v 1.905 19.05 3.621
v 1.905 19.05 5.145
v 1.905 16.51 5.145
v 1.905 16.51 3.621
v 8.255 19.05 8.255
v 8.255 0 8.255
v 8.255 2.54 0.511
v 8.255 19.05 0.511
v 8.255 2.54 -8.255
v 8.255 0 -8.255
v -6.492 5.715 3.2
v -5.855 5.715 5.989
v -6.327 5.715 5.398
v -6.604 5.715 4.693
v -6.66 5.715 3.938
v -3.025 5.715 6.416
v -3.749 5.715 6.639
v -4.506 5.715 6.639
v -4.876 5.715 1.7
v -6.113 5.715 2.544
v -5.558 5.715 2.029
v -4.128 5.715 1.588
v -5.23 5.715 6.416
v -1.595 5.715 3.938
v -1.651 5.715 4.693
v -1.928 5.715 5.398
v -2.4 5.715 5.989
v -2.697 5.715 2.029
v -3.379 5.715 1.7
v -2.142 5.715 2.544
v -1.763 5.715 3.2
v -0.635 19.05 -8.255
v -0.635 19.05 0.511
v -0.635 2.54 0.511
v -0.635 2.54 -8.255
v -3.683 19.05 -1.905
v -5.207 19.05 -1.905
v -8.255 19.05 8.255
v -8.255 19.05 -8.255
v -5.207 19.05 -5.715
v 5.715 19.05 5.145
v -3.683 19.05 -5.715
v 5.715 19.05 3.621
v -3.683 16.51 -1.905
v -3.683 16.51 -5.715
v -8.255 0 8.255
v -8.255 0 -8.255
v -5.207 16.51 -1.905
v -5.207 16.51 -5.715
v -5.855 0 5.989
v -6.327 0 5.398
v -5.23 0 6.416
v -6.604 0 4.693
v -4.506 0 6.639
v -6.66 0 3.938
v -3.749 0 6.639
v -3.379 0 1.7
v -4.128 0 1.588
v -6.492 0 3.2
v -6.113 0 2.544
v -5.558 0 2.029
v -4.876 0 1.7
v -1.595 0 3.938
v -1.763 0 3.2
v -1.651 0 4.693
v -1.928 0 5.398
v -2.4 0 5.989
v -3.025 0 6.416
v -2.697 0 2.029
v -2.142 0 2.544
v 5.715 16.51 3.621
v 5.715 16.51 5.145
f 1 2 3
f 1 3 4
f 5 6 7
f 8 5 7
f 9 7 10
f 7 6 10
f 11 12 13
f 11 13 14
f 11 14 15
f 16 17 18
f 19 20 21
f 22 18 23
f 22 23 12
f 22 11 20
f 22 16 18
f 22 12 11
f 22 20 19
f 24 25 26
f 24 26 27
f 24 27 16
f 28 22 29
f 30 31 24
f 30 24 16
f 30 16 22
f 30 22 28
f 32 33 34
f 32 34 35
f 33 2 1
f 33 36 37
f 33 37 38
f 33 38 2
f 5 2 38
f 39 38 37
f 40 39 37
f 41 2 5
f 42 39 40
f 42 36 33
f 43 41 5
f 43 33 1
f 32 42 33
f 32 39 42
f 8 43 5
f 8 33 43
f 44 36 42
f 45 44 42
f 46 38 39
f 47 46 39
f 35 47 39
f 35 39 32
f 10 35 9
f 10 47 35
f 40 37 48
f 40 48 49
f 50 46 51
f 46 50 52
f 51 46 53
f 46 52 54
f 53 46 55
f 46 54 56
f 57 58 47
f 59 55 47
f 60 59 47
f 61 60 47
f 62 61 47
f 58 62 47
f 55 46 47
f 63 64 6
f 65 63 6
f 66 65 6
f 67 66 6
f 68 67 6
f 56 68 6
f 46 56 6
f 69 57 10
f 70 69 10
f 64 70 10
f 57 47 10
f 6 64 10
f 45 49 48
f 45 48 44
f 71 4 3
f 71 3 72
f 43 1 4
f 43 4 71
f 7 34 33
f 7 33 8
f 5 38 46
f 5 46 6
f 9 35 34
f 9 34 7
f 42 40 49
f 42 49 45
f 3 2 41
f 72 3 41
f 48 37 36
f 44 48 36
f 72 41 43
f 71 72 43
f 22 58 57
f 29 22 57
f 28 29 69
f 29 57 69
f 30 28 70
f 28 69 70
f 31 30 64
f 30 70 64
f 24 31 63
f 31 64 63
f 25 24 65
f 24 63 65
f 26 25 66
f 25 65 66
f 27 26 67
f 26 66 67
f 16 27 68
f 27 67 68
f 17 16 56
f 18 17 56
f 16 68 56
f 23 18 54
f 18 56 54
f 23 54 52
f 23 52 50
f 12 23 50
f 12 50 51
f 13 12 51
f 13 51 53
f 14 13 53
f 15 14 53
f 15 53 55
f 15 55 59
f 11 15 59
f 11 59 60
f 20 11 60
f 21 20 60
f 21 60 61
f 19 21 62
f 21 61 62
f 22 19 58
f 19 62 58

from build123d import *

# Parameters (mm, degrees)
SKETCH3_W           = 16.51
SKETCH3_H           = 16.51
BOSS_EXTRUDE2_DEPTH = 19.05
SKETCH5_R           = 2.54
CUT_EXTRUDE2_DEPTH  = 5.715
SKETCH6_W           = 8.89
SKETCH6_H           = 8.765916865
CUT_EXTRUDE3_DEPTH  = 16.51
SKETCH7_W           = 1.524
SKETCH7_H           = 3.81
SKETCH7_W_2         = 3.81
SKETCH7_H_2         = 1.524
CUT_EXTRUDE4_DEPTH  = 2.54


with BuildPart() as part:
    # Sketch3 → Boss-Extrude2 (new body)
    with BuildSketch(Plane(origin=(0, 0, 0), x_dir=(1, 0, 0), z_dir=(0, 1, 0))):
        Rectangle(SKETCH3_W, SKETCH3_H)
    extrude(amount=BOSS_EXTRUDE2_DEPTH)

    # Sketch5 → Cut-Extrude2 (cut)
    with BuildSketch(Plane.XZ):
        with Locations(Location((-4.1275, 4.1275, 0), (0, 0, 270))):
            Circle(SKETCH5_R)
    extrude(amount=-CUT_EXTRUDE2_DEPTH, mode=Mode.SUBTRACT)

    # Sketch6 → Cut-Extrude3 (cut)
    with BuildSketch(Plane(origin=(0, 19.05, 0), x_dir=(1, 0, 0), z_dir=(0, 1, 0))):
        with Locations((3.81, 3.872041568)):
            Rectangle(SKETCH6_W, SKETCH6_H)
    extrude(amount=-CUT_EXTRUDE3_DEPTH, mode=Mode.SUBTRACT)

    # Sketch7 → Cut-Extrude4 (cut)
    with BuildSketch(Plane(origin=(0, 19.05, 0), x_dir=(1, 0, 0), z_dir=(0, 1, 0))):
        with Locations((-4.445, 3.81)):
            Rectangle(SKETCH7_W, SKETCH7_H)
        with Locations((3.81, -4.382958433)):
            Rectangle(SKETCH7_W_2, SKETCH7_H_2)
    extrude(amount=-CUT_EXTRUDE4_DEPTH, mode=Mode.SUBTRACT)


solid = part.part
